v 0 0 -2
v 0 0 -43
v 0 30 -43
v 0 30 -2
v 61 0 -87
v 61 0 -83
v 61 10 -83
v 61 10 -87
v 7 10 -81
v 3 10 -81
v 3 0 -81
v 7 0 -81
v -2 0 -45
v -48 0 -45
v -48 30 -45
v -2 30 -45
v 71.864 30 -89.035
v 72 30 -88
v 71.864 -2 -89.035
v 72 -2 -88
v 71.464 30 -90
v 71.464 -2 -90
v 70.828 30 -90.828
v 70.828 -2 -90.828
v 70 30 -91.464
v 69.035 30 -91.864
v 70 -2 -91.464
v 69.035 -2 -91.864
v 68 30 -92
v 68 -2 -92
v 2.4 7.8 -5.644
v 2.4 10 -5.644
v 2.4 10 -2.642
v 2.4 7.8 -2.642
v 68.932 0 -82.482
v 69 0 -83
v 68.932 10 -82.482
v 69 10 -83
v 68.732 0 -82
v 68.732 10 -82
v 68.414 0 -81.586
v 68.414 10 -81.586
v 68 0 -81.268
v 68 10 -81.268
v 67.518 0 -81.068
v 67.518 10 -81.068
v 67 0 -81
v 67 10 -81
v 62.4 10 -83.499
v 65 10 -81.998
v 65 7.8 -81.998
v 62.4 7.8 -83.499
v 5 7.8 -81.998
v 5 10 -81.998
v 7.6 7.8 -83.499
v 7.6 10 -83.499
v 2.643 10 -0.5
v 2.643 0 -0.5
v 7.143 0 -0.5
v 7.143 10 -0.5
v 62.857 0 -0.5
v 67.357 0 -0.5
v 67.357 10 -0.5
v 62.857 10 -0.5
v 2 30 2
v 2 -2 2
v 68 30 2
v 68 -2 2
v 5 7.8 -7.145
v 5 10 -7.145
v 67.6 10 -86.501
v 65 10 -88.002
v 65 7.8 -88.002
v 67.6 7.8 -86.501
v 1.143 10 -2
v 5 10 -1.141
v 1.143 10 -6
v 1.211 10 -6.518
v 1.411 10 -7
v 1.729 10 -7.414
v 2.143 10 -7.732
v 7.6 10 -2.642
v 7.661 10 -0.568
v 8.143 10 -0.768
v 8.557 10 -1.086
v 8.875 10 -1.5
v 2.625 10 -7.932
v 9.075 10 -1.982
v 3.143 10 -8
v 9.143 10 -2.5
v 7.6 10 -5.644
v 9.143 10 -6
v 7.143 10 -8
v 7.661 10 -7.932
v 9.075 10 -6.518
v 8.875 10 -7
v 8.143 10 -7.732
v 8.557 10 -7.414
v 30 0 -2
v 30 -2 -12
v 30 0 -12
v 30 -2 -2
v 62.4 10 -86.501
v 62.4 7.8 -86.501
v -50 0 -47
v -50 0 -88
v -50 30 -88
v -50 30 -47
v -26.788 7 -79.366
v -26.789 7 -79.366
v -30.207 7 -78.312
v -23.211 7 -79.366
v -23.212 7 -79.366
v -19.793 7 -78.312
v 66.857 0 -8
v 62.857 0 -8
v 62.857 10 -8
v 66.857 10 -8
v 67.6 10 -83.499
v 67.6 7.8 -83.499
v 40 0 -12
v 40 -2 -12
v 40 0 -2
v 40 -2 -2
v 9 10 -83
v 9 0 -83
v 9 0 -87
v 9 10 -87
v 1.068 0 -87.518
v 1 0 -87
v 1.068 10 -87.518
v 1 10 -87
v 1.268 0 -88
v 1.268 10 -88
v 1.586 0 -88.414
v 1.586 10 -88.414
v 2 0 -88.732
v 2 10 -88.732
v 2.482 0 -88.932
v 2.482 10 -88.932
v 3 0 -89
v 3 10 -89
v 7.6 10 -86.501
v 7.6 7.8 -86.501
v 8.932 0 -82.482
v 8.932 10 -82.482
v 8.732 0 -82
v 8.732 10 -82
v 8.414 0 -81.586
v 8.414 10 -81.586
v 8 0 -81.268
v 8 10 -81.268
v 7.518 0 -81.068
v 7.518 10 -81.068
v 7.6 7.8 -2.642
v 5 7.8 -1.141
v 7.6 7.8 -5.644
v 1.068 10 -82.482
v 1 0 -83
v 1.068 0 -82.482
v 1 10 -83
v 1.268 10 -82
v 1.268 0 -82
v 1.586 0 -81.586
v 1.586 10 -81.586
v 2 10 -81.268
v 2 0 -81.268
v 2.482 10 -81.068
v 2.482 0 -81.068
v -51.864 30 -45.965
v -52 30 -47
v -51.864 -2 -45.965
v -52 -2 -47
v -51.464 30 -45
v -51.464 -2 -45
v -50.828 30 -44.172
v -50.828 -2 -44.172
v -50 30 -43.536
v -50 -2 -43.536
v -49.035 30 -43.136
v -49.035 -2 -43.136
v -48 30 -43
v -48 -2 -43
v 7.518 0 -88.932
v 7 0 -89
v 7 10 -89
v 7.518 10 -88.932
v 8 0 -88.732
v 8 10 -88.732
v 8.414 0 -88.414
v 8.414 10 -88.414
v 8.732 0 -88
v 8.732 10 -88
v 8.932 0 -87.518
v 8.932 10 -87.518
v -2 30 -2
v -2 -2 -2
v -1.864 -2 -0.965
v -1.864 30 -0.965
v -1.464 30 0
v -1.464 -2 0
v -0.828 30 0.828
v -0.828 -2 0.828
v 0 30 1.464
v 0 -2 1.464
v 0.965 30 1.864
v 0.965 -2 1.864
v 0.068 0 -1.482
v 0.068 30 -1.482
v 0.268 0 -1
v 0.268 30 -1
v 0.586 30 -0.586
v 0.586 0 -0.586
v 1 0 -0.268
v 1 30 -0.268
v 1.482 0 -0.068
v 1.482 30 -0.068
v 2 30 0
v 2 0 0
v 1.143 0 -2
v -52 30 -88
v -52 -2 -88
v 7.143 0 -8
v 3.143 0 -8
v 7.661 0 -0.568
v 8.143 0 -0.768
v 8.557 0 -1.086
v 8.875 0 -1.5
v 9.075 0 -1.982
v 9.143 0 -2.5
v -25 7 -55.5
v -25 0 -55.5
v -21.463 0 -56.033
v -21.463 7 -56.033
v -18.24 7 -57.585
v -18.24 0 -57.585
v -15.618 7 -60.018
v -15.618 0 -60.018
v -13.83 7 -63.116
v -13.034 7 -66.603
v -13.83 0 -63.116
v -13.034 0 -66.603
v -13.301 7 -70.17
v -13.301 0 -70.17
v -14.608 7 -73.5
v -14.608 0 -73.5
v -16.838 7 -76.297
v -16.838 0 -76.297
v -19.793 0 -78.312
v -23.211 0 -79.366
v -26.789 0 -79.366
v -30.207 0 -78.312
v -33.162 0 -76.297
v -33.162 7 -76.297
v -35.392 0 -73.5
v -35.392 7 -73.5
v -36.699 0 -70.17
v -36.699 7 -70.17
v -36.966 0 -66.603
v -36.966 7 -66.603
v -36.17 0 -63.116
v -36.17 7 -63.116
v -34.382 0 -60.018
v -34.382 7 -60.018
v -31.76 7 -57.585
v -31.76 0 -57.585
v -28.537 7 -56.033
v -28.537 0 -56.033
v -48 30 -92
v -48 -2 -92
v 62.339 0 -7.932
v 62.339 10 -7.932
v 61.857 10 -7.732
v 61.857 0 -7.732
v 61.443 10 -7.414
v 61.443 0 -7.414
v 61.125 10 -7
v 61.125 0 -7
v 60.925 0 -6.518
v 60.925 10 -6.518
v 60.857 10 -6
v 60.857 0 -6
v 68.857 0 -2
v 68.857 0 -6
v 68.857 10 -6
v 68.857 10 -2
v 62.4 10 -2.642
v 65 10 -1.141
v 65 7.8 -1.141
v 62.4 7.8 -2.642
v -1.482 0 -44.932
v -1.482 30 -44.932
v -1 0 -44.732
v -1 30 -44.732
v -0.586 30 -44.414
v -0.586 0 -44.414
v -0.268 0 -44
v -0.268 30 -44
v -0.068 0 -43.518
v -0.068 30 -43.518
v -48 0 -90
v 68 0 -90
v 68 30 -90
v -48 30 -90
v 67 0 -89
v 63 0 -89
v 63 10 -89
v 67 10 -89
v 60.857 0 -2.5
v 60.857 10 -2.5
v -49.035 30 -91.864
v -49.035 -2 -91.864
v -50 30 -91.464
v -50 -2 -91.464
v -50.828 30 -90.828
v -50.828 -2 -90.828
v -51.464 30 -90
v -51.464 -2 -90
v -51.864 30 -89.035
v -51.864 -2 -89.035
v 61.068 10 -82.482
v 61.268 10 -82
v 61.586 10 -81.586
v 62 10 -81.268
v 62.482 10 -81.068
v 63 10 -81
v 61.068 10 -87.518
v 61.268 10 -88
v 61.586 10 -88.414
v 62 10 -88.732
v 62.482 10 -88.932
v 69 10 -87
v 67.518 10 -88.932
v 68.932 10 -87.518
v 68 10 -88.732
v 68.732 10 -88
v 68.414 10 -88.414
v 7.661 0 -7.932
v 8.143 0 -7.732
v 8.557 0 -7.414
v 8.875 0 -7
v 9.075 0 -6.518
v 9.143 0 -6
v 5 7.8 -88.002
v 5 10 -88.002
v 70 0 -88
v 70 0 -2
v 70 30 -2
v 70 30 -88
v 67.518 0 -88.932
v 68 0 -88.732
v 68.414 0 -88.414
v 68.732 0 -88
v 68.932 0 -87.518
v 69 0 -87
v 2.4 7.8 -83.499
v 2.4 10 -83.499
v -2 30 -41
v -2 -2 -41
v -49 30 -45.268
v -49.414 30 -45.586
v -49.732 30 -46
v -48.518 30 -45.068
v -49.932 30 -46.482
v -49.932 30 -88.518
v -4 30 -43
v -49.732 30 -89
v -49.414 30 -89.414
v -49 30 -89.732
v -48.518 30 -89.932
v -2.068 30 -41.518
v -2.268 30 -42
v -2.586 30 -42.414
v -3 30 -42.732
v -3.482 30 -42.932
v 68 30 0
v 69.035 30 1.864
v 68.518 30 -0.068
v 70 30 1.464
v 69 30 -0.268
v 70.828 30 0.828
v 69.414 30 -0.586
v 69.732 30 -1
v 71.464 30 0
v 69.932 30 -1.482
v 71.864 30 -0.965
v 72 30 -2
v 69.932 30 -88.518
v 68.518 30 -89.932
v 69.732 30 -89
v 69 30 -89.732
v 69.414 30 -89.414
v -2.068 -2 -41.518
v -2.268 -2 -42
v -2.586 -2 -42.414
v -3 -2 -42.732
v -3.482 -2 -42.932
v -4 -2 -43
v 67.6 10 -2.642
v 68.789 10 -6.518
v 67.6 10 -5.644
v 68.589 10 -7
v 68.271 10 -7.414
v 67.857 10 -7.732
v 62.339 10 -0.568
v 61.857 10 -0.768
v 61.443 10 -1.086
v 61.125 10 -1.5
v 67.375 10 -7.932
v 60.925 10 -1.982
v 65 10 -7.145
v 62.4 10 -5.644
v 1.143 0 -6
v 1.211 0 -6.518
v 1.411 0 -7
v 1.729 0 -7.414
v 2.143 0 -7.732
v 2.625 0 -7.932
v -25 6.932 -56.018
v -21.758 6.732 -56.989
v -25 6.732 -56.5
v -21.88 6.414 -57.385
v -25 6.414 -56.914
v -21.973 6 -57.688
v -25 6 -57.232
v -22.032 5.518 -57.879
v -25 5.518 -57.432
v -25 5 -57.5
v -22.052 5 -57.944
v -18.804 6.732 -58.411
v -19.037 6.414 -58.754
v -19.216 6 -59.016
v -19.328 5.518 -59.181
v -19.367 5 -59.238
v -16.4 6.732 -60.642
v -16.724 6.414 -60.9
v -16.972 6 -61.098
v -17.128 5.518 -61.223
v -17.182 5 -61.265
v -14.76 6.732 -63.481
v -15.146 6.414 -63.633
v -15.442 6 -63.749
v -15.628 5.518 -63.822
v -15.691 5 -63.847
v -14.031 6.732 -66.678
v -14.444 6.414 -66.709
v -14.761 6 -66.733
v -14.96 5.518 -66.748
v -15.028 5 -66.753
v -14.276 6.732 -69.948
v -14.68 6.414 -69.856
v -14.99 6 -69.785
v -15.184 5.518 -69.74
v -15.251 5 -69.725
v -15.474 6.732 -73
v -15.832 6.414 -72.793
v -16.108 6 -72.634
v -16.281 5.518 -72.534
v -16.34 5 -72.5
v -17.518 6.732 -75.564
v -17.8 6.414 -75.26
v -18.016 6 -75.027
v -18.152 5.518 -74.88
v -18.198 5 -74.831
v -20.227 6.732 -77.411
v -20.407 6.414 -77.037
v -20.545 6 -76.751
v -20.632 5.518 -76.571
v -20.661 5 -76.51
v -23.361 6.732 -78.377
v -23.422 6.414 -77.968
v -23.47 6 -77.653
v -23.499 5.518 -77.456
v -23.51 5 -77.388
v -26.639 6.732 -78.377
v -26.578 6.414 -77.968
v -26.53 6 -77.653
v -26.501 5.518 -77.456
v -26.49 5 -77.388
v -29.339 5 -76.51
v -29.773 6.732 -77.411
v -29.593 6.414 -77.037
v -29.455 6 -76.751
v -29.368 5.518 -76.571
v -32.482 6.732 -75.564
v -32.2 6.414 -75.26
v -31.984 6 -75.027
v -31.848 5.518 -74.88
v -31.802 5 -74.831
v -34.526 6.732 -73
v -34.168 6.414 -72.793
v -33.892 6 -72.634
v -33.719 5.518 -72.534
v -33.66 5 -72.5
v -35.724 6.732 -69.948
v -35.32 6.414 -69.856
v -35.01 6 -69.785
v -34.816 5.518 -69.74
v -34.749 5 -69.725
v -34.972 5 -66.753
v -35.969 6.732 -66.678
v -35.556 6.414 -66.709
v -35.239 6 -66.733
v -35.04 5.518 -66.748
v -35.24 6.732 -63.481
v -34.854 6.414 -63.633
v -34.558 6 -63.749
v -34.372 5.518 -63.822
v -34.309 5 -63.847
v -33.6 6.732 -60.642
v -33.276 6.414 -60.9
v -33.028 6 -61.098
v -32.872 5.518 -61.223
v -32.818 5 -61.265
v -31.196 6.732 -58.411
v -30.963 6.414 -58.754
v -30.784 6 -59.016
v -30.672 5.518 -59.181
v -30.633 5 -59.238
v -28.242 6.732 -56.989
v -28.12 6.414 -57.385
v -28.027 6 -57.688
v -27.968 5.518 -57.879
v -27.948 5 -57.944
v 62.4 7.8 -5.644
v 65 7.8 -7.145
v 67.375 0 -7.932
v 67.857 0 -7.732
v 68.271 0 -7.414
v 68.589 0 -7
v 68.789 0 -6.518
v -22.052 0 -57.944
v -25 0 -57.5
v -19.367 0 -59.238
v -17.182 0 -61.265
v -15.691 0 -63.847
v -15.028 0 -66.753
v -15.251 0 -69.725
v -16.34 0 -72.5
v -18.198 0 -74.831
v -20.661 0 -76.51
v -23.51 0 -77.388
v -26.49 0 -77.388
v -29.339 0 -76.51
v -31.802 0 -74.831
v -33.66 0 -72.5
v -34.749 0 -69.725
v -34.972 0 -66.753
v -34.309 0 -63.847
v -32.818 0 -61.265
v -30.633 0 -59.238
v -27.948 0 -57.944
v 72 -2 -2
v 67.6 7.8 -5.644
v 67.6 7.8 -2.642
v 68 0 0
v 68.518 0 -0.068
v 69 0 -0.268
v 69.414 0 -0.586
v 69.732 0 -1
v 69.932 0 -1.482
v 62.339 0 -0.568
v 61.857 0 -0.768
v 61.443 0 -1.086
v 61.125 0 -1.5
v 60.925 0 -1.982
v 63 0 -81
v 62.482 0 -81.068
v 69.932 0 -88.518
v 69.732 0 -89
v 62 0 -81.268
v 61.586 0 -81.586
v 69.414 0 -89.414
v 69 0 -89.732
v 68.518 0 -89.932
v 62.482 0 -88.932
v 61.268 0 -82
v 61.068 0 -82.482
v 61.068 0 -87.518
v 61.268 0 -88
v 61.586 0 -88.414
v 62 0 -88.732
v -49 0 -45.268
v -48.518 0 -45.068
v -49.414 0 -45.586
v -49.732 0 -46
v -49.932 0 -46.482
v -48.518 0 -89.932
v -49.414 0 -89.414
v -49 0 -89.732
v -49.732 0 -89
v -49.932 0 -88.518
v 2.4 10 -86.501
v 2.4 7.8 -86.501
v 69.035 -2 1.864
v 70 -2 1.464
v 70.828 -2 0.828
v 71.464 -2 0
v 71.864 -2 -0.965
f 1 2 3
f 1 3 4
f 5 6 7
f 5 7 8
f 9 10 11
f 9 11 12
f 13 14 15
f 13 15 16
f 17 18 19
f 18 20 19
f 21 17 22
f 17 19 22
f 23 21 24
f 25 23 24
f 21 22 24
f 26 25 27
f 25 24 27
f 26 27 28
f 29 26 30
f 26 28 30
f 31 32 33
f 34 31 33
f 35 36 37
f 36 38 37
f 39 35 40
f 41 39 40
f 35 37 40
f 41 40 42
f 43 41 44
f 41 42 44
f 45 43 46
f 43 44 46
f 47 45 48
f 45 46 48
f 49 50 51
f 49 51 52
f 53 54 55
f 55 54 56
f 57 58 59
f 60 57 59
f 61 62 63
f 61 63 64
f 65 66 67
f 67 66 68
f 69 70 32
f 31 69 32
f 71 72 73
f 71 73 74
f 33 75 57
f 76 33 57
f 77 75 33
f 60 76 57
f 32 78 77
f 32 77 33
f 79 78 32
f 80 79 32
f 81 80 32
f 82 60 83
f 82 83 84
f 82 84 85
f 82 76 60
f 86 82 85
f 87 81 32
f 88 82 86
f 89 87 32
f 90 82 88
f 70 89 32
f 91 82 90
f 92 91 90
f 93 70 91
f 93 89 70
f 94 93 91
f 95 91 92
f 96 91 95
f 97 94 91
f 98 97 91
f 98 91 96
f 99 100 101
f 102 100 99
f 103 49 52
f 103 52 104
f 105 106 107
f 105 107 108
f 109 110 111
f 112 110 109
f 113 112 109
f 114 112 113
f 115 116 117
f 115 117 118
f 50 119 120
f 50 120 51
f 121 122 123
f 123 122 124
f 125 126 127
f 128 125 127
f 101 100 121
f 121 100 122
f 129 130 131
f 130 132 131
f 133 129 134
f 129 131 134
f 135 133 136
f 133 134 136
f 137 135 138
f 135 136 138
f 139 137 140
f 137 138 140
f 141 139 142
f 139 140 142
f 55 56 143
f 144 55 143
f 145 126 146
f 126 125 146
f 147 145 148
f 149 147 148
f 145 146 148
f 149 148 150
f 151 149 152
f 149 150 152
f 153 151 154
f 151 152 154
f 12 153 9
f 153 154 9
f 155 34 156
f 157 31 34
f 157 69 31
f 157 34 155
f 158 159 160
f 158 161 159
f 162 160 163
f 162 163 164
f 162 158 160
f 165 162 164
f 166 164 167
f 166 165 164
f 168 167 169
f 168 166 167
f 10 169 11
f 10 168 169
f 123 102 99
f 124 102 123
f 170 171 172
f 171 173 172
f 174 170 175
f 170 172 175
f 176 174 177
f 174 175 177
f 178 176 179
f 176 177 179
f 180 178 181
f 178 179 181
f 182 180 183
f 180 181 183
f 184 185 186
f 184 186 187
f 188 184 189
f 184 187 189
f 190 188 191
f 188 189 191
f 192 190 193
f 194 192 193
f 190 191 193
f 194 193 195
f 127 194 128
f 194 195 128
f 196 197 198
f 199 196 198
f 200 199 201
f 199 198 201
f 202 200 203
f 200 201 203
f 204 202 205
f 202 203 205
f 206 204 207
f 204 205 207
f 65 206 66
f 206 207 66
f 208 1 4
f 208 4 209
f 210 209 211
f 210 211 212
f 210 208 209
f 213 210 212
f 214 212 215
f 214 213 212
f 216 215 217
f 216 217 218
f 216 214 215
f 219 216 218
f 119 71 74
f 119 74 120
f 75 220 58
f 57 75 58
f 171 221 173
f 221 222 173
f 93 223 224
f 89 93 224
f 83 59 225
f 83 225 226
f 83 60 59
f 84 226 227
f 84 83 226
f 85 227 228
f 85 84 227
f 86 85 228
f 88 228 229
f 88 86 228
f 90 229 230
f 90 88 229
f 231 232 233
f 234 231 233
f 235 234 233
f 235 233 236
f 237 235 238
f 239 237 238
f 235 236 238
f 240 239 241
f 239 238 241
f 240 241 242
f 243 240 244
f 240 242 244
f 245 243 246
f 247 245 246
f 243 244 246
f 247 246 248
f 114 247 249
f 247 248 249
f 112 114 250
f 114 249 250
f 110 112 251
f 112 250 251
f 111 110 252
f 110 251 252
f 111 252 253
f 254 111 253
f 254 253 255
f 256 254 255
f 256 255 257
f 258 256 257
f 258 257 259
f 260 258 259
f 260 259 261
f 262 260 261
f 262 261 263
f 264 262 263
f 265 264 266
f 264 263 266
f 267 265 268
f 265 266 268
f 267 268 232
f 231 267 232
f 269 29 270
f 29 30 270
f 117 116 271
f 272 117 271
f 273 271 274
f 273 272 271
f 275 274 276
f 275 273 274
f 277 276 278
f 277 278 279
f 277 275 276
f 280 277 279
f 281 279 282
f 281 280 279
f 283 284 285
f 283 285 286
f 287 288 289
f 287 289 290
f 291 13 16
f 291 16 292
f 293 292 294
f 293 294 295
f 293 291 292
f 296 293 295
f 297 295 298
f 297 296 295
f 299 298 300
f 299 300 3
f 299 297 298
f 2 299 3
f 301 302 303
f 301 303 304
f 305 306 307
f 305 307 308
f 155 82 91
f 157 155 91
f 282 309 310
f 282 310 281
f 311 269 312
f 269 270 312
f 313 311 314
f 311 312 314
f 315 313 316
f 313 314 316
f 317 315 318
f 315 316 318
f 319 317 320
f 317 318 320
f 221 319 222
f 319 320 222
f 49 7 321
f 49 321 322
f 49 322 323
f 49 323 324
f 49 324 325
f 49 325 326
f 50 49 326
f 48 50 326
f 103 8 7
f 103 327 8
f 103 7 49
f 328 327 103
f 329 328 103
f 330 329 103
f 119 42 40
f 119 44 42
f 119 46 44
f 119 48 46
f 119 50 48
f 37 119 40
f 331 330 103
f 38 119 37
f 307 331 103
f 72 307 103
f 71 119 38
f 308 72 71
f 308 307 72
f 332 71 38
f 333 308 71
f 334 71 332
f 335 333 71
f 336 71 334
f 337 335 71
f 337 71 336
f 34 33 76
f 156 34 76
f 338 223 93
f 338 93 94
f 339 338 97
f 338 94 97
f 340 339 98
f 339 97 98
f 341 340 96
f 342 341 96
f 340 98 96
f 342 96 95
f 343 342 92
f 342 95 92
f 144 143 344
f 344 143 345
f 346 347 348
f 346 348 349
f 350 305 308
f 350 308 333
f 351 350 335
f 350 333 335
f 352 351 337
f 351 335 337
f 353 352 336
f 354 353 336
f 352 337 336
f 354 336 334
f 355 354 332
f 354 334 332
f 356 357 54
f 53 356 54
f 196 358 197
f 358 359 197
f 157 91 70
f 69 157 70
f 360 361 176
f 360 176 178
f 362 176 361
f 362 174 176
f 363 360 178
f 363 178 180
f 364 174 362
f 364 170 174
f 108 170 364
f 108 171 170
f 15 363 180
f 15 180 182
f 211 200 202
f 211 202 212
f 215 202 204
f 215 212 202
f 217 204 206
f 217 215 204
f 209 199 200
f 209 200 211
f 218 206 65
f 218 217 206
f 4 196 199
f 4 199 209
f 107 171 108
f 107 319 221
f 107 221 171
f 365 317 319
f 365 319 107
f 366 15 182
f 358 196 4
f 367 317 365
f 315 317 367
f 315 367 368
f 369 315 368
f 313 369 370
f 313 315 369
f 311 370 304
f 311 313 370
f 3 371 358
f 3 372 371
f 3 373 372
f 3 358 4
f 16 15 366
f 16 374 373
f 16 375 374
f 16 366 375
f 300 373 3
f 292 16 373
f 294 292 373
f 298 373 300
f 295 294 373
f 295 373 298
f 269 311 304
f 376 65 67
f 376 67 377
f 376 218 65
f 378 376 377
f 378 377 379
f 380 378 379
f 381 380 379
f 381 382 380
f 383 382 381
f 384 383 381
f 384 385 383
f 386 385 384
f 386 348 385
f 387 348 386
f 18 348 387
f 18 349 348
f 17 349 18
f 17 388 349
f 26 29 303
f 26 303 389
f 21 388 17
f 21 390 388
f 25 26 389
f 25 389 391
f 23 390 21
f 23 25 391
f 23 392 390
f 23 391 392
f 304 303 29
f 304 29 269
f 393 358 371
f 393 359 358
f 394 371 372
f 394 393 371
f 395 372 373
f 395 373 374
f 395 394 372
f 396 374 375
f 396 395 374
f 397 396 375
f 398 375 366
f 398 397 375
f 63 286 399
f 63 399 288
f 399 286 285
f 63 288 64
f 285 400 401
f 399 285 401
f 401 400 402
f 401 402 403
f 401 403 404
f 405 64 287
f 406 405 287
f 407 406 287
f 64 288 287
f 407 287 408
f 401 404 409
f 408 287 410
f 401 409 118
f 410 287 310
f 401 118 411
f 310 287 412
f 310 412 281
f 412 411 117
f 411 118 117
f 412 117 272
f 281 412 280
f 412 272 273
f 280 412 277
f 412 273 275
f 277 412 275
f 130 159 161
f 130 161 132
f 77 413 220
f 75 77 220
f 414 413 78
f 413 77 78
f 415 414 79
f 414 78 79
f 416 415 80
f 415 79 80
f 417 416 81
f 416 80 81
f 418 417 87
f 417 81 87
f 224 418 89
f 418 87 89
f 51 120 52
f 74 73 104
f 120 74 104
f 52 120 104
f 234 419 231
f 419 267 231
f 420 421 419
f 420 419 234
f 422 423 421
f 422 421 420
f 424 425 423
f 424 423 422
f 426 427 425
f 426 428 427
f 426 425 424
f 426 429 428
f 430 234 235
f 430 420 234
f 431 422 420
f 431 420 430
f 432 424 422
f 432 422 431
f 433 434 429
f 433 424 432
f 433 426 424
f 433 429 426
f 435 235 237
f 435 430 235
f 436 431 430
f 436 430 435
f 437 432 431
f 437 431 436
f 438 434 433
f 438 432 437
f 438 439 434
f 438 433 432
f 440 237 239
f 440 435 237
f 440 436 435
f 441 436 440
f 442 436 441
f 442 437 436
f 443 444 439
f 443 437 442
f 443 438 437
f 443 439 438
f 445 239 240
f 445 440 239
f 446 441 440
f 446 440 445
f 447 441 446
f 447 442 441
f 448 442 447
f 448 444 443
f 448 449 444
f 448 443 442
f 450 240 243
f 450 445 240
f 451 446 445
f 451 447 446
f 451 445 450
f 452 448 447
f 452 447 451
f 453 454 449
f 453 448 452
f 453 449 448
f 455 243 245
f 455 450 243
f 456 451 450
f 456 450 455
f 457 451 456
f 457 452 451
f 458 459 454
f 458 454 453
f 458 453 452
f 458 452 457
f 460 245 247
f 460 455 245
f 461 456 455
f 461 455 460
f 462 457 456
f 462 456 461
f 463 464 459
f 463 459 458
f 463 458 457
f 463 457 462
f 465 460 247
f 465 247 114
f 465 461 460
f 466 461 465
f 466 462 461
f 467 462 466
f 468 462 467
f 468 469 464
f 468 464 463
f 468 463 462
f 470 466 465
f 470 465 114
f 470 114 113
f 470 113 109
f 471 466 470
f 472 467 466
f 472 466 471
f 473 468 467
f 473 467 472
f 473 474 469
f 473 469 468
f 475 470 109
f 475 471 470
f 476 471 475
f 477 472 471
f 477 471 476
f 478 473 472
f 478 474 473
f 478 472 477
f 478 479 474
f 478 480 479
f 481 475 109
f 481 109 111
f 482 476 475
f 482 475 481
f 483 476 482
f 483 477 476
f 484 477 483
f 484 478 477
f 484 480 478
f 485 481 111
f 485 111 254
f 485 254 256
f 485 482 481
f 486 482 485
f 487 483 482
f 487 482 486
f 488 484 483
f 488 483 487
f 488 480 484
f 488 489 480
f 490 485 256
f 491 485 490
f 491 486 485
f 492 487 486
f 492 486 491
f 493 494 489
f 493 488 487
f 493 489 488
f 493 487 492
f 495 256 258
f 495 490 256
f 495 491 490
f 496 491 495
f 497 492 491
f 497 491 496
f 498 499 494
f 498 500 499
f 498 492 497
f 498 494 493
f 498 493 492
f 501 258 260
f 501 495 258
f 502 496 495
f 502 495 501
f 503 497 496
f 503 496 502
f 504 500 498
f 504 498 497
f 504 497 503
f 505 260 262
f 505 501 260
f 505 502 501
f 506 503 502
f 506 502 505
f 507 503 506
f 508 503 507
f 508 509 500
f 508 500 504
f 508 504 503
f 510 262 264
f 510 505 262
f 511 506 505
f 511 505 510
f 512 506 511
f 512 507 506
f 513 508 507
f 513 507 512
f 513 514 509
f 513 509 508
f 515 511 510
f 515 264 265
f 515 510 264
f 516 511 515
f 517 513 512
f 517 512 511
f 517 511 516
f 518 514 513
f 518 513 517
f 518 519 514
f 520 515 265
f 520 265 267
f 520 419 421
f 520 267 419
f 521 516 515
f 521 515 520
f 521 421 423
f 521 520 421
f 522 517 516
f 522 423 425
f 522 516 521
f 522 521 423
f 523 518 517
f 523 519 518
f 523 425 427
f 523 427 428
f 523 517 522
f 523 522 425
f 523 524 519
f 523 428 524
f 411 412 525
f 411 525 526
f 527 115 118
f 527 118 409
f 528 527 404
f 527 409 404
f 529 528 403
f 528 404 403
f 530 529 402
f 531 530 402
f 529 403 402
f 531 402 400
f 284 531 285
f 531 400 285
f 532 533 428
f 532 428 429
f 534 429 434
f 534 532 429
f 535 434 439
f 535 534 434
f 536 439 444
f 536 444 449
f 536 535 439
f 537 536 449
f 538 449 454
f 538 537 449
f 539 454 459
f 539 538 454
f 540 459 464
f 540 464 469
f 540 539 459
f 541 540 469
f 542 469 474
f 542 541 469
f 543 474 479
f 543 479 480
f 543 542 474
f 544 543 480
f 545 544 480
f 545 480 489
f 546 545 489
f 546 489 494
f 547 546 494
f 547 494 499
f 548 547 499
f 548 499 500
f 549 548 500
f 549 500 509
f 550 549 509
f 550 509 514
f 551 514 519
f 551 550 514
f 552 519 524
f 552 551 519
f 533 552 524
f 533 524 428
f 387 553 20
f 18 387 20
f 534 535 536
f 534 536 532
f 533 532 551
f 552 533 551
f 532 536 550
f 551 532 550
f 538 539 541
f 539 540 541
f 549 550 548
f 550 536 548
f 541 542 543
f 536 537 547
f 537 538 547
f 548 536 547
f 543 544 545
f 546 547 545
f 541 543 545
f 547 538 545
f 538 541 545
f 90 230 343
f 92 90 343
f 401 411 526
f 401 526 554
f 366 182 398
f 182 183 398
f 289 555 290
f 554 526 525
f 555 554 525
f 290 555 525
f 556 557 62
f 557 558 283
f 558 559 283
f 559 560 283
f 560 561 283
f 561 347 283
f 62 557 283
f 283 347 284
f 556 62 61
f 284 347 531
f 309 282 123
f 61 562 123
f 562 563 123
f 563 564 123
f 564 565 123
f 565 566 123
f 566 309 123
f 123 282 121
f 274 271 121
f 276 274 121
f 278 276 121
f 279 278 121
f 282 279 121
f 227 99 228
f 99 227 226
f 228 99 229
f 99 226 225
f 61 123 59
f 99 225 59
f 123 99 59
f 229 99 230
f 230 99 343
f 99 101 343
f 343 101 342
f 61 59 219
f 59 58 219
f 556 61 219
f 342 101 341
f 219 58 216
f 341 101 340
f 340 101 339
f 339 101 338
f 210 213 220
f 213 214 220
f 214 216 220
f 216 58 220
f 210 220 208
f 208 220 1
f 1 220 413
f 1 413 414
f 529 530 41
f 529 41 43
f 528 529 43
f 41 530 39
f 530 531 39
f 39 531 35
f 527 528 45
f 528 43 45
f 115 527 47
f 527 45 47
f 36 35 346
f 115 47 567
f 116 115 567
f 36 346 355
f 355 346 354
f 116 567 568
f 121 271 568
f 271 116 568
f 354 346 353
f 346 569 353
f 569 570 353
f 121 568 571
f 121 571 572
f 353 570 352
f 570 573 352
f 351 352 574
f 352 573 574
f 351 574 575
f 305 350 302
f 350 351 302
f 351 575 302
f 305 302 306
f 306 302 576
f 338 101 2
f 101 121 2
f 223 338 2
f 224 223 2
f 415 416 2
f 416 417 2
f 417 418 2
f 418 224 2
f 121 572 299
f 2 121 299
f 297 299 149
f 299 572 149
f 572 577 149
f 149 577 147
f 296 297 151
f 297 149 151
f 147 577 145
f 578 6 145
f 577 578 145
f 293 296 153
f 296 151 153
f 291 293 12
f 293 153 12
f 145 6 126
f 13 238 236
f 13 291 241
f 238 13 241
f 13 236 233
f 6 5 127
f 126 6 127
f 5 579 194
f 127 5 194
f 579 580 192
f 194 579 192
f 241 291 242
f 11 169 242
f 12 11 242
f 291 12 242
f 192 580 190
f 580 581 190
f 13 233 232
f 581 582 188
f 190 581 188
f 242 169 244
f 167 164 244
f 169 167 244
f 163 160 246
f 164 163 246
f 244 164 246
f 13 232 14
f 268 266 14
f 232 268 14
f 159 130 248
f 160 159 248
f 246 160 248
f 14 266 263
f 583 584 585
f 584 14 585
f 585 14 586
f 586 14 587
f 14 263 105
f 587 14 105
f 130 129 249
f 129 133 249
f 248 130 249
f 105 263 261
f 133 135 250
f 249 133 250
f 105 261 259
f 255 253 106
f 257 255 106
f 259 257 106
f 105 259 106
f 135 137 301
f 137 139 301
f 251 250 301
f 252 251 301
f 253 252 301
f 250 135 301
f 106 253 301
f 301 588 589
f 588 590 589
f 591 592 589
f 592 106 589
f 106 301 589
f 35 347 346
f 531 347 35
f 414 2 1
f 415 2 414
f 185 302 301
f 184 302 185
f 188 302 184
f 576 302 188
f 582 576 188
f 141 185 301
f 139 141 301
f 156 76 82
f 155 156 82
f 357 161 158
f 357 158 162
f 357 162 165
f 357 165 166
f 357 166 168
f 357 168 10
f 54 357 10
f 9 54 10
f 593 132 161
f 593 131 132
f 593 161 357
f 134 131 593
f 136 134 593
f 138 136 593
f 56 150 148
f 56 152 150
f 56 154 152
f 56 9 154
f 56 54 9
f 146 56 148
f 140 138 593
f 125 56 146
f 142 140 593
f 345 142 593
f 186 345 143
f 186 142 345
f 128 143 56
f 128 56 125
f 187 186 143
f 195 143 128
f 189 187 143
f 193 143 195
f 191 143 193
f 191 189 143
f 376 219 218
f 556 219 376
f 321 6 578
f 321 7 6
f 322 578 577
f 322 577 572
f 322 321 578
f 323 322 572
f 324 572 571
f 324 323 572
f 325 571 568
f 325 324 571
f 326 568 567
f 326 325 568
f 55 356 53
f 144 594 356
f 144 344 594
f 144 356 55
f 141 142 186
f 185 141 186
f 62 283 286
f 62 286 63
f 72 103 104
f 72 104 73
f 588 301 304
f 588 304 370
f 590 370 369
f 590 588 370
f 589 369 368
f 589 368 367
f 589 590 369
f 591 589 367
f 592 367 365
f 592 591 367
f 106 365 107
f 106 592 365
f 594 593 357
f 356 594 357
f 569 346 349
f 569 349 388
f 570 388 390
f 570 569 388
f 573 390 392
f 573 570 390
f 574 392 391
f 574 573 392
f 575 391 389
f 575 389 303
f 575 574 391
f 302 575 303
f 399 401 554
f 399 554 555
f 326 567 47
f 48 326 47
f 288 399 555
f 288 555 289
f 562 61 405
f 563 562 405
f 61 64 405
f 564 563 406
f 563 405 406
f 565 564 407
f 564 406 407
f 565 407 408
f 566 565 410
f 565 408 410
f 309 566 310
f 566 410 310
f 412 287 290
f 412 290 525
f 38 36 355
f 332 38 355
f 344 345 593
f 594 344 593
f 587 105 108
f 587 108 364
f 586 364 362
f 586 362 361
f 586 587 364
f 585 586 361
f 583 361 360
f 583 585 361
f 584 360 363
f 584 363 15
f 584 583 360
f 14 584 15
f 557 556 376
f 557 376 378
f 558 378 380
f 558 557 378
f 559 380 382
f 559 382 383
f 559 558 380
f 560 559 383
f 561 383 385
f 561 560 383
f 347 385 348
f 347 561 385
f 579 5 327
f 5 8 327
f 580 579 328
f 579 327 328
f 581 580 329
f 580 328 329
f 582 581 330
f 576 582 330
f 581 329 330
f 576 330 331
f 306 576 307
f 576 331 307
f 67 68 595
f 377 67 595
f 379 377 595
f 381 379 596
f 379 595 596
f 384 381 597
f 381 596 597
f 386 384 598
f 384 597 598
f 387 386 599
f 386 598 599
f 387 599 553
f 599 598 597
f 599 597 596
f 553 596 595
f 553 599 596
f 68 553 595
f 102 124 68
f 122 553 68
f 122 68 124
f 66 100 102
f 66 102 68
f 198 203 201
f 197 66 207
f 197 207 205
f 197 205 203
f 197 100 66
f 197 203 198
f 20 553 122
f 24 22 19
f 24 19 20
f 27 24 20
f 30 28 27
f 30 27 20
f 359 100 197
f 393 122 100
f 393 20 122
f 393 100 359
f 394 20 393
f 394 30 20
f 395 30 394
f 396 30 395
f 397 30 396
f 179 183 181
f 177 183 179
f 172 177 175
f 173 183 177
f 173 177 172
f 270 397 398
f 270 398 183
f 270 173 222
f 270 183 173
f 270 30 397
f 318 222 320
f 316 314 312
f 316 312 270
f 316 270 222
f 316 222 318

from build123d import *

# Parameters (mm, degrees)
BOSS_EXTRUDE1_DEPTH = 30
BOSS_EXTRUDE2_DEPTH = 2
SKETCH5_R           = 12
SKETCH5_R_2         = 10
BOSS_EXTRUDE3_DEPTH = 7
SKETCH6_W           = 8
SKETCH6_H           = 8
BOSS_EXTRUDE4_DEPTH = 10
CUT_EXTRUDE1_START  = 10
CUT_EXTRUDE1_DEPTH  = 2.2
FILLET1_R           = 2
SKETCH8_W           = 10
SKETCH8_H           = 10
CUT_EXTRUDE3_DEPTH  = 122.128031438


with BuildPart() as part:
    # Sketch2 → Boss-Extrude1 (new body)
    with BuildSketch(Plane(origin=(0, 0, 0), x_dir=(1, 0, 0), z_dir=(0, 1, 0))):
        with BuildLine():
            Line((72, 2), (72, 88))
            ThreePointArc((72, 88), (70.828427125, 90.828427125), (68, 92))
            Line((68, 92), (-48, 92))
            ThreePointArc((-48, 92), (-50.828427125, 90.828427125), (-52, 88))
            Line((-52, 88), (-52, 47))
            ThreePointArc((-52, 47), (-50.828427125, 44.171572875), (-48, 43))
            Line((-48, 43), (-2, 43))
            Line((-2, 43), (-2, 2))
            ThreePointArc((-2, 2), (-0.828427125, -0.828427125), (2, -2))
            Line((2, -2), (68, -2))
            ThreePointArc((68, -2), (70.828427125, -0.828427125), (72, 2))
        make_face()
        with BuildLine():
            Line((70, 2), (70, 88))
            ThreePointArc((70, 88), (69.414213562, 89.414213562), (68, 90))
            Line((68, 90), (-48, 90))
            ThreePointArc((-48, 90), (-49.414213562, 89.414213562), (-50, 88))
            Line((-50, 88), (-50, 47))
            ThreePointArc((-50, 47), (-49.414213562, 45.585786438), (-48, 45))
            Line((-48, 45), (-2, 45))
            ThreePointArc((-2, 45), (-0.585786438, 44.414213562), (0, 43))
            Line((0, 43), (0, 2))
            ThreePointArc((0, 2), (0.585786438, 0.585786438), (2, 0))
            Line((2, 0), (68, 0))
            ThreePointArc((68, 0), (69.414213562, 0.585786438), (70, 2))
        make_face(mode=Mode.SUBTRACT)
    extrude(amount=BOSS_EXTRUDE1_DEPTH)



with BuildPart() as body_2:
    # Sketch3 → Boss-Extrude2 (new body)
    # profile 1 of 2: a face of its own
    with BuildSketch(Plane(origin=(0, 0, 0), x_dir=(1, 0, 0), z_dir=(0, 1, 0))):
        with BuildLine():
            Line((-48, 92), (68, 92))
            ThreePointArc((68, 92), (70.828427125, 90.828427125), (72, 88))
            Line((72, 88), (72, 2))
            ThreePointArc((72, 2), (70.828427125, -0.828427125), (68, -2))
            Line((68, -2), (2, -2))
            ThreePointArc((2, -2), (-0.828427125, -0.828427125), (-2, 2))
            Line((-2, 2), (-2, 43))
            Line((-2, 43), (-48, 43))
            ThreePointArc((-48, 43), (-50.828427125, 44.171572875), (-52, 47))
            Line((-52, 47), (-52, 88))
            ThreePointArc((-52, 88), (-50.828427125, 90.828427125), (-48, 92))
        make_face()
        with BuildLine():
            Line((0, 43), (0, 2))
            ThreePointArc((0, 2), (0.585786438, 0.585786438), (2, 0))
            Line((2, 0), (68, 0))
            ThreePointArc((68, 0), (69.414213562, 0.585786438), (70, 2))
            Line((70, 2), (70, 88))
            ThreePointArc((70, 88), (69.414213562, 89.414213562), (68, 90))
            Line((68, 90), (-48, 90))
            ThreePointArc((-48, 90), (-49.414213562, 89.414213562), (-50, 88))
            Line((-50, 88), (-50, 47))
            ThreePointArc((-50, 47), (-49.414213562, 45.585786438), (-48, 45))
            Line((-48, 45), (-2, 45))
            ThreePointArc((-2, 45), (-0.585786438, 44.414213562), (0, 43))
        make_face(mode=Mode.SUBTRACT)
    # profile 2 of 2: a face of its own
    with BuildSketch(Plane(origin=(0, 0, 0), x_dir=(1, 0, 0), z_dir=(0, 1, 0))):
        with BuildLine():
            ThreePointArc((0, 43), (-0.585786438, 44.414213562), (-2, 45))
            Line((-2, 45), (-48, 45))
            ThreePointArc((-48, 45), (-49.414213562, 45.585786438), (-50, 47))
            Line((-50, 47), (-50, 88))
            ThreePointArc((-50, 88), (-49.414213562, 89.414213562), (-48, 90))
            Line((-48, 90), (68, 90))
            ThreePointArc((68, 90), (69.414213562, 89.414213562), (70, 88))
            Line((70, 88), (70, 2))
            ThreePointArc((70, 2), (69.414213562, 0.585786438), (68, 0))
            Line((68, 0), (2, 0))
            ThreePointArc((2, 0), (0.585786438, 0.585786438), (0, 2))
            Line((0, 2), (0, 43))
        make_face()
    extrude(amount=-BOSS_EXTRUDE2_DEPTH)


with BuildPart() as part_1:
    add(part.part)

    add(body_2.part)  # Boss-Extrude3 merges body 2
    # Sketch5 → Boss-Extrude3 (add)
    with BuildSketch(Plane(origin=(0, 0, 0), x_dir=(1, 0, 0), z_dir=(0, 1, 0))):
        with Locations(Location((-25, 67.5, 0), (0, 0, 270))):
            Circle(SKETCH5_R)
        with Locations(Location((-25, 67.5, 0), (0, 0, 270))):
            Circle(SKETCH5_R_2, mode=Mode.SUBTRACT)
    extrude(amount=BOSS_EXTRUDE3_DEPTH)

    # Sketch6 → Boss-Extrude4 (add)
    with BuildSketch(Plane(origin=(0, 0, 0), x_dir=(1, 0, 0), z_dir=(0, 1, 0))):
        with Locations((65, 85)):
            Rectangle(SKETCH6_W, SKETCH6_H)
        Polygon((60.857142857, 8), (68.857142857, 8), (68.857142857, 2), (67.357142857, 0.5), (60.857142857, 0.5), align=None)
        Polygon((9.142857143, 0.5), (9.142857143, 8), (1.142857143, 8), (1.142857143, 2), (2.642857143, 0.5), align=None)
        with Locations((5, 85)):
            Rectangle(SKETCH6_W, SKETCH6_H)
    extrude(amount=BOSS_EXTRUDE4_DEPTH)

    # Sketch7 → Cut-Extrude1 (cut)
    with BuildSketch(Plane(origin=(0, 0, 0), x_dir=(1, 0, 0), z_dir=(0, 1, 0)).offset(CUT_EXTRUDE1_START)):
        Polygon((2.4, 86.5011107), (2.4, 83.4988893), (5, 81.9977786), (7.6, 83.4988893), (7.6, 86.5011107), (5, 88.0022214), align=None)
        Polygon((2.4, 5.643967843), (2.4, 2.641746443), (5, 1.140635743), (7.6, 2.641746443), (7.6, 5.643967843), (5, 7.145078543), align=None)
        Polygon((65, 1.140635743), (62.4, 2.641746443), (62.4, 5.643967843), (65, 7.145078543), (67.6, 5.643967843), (67.6, 2.641746443), align=None)
        Polygon((62.4, 86.5011107), (65, 88.0022214), (67.6, 86.5011107), (67.6, 83.4988893), (65, 81.9977786), (62.4, 83.4988893), align=None)
    extrude(amount=-CUT_EXTRUDE1_DEPTH, mode=Mode.SUBTRACT)

    # Fillet1
    fillet1_edges = [part_1.edges().sort_by_distance(p)[0] for p in [
        (61, 5, -89),
        (61, 5, -81),
        (69, 5, -81),
        (69, 5, -89),
        (60.857142857, 5, -8),
        (60.857142857, 5, -0.5),
        (68.857142857, 5, -8),
        (9.142857143, 5, -8),
        (1.142857143, 5, -8),
        (9.142857143, 5, -0.5),
        (9, 5, -81),
        (9, 5, -89),
        (1, 5, -89),
        (1, 5, -81),
        (-2, 14, -43),
        (-25, 7, -77.5),
    ]]
    fillet(fillet1_edges, radius=FILLET1_R - 0.0001)  # a hair under: the kernel refuses the full size

    # Sketch8 → Cut-Extrude3 (cut, through all)
    with BuildSketch(Plane.XZ.offset(2)):
        with Locations((35, -7)):
            Rectangle(SKETCH8_W, SKETCH8_H)
    extrude(amount=-CUT_EXTRUDE3_DEPTH, mode=Mode.SUBTRACT)


solid = part_1.part
